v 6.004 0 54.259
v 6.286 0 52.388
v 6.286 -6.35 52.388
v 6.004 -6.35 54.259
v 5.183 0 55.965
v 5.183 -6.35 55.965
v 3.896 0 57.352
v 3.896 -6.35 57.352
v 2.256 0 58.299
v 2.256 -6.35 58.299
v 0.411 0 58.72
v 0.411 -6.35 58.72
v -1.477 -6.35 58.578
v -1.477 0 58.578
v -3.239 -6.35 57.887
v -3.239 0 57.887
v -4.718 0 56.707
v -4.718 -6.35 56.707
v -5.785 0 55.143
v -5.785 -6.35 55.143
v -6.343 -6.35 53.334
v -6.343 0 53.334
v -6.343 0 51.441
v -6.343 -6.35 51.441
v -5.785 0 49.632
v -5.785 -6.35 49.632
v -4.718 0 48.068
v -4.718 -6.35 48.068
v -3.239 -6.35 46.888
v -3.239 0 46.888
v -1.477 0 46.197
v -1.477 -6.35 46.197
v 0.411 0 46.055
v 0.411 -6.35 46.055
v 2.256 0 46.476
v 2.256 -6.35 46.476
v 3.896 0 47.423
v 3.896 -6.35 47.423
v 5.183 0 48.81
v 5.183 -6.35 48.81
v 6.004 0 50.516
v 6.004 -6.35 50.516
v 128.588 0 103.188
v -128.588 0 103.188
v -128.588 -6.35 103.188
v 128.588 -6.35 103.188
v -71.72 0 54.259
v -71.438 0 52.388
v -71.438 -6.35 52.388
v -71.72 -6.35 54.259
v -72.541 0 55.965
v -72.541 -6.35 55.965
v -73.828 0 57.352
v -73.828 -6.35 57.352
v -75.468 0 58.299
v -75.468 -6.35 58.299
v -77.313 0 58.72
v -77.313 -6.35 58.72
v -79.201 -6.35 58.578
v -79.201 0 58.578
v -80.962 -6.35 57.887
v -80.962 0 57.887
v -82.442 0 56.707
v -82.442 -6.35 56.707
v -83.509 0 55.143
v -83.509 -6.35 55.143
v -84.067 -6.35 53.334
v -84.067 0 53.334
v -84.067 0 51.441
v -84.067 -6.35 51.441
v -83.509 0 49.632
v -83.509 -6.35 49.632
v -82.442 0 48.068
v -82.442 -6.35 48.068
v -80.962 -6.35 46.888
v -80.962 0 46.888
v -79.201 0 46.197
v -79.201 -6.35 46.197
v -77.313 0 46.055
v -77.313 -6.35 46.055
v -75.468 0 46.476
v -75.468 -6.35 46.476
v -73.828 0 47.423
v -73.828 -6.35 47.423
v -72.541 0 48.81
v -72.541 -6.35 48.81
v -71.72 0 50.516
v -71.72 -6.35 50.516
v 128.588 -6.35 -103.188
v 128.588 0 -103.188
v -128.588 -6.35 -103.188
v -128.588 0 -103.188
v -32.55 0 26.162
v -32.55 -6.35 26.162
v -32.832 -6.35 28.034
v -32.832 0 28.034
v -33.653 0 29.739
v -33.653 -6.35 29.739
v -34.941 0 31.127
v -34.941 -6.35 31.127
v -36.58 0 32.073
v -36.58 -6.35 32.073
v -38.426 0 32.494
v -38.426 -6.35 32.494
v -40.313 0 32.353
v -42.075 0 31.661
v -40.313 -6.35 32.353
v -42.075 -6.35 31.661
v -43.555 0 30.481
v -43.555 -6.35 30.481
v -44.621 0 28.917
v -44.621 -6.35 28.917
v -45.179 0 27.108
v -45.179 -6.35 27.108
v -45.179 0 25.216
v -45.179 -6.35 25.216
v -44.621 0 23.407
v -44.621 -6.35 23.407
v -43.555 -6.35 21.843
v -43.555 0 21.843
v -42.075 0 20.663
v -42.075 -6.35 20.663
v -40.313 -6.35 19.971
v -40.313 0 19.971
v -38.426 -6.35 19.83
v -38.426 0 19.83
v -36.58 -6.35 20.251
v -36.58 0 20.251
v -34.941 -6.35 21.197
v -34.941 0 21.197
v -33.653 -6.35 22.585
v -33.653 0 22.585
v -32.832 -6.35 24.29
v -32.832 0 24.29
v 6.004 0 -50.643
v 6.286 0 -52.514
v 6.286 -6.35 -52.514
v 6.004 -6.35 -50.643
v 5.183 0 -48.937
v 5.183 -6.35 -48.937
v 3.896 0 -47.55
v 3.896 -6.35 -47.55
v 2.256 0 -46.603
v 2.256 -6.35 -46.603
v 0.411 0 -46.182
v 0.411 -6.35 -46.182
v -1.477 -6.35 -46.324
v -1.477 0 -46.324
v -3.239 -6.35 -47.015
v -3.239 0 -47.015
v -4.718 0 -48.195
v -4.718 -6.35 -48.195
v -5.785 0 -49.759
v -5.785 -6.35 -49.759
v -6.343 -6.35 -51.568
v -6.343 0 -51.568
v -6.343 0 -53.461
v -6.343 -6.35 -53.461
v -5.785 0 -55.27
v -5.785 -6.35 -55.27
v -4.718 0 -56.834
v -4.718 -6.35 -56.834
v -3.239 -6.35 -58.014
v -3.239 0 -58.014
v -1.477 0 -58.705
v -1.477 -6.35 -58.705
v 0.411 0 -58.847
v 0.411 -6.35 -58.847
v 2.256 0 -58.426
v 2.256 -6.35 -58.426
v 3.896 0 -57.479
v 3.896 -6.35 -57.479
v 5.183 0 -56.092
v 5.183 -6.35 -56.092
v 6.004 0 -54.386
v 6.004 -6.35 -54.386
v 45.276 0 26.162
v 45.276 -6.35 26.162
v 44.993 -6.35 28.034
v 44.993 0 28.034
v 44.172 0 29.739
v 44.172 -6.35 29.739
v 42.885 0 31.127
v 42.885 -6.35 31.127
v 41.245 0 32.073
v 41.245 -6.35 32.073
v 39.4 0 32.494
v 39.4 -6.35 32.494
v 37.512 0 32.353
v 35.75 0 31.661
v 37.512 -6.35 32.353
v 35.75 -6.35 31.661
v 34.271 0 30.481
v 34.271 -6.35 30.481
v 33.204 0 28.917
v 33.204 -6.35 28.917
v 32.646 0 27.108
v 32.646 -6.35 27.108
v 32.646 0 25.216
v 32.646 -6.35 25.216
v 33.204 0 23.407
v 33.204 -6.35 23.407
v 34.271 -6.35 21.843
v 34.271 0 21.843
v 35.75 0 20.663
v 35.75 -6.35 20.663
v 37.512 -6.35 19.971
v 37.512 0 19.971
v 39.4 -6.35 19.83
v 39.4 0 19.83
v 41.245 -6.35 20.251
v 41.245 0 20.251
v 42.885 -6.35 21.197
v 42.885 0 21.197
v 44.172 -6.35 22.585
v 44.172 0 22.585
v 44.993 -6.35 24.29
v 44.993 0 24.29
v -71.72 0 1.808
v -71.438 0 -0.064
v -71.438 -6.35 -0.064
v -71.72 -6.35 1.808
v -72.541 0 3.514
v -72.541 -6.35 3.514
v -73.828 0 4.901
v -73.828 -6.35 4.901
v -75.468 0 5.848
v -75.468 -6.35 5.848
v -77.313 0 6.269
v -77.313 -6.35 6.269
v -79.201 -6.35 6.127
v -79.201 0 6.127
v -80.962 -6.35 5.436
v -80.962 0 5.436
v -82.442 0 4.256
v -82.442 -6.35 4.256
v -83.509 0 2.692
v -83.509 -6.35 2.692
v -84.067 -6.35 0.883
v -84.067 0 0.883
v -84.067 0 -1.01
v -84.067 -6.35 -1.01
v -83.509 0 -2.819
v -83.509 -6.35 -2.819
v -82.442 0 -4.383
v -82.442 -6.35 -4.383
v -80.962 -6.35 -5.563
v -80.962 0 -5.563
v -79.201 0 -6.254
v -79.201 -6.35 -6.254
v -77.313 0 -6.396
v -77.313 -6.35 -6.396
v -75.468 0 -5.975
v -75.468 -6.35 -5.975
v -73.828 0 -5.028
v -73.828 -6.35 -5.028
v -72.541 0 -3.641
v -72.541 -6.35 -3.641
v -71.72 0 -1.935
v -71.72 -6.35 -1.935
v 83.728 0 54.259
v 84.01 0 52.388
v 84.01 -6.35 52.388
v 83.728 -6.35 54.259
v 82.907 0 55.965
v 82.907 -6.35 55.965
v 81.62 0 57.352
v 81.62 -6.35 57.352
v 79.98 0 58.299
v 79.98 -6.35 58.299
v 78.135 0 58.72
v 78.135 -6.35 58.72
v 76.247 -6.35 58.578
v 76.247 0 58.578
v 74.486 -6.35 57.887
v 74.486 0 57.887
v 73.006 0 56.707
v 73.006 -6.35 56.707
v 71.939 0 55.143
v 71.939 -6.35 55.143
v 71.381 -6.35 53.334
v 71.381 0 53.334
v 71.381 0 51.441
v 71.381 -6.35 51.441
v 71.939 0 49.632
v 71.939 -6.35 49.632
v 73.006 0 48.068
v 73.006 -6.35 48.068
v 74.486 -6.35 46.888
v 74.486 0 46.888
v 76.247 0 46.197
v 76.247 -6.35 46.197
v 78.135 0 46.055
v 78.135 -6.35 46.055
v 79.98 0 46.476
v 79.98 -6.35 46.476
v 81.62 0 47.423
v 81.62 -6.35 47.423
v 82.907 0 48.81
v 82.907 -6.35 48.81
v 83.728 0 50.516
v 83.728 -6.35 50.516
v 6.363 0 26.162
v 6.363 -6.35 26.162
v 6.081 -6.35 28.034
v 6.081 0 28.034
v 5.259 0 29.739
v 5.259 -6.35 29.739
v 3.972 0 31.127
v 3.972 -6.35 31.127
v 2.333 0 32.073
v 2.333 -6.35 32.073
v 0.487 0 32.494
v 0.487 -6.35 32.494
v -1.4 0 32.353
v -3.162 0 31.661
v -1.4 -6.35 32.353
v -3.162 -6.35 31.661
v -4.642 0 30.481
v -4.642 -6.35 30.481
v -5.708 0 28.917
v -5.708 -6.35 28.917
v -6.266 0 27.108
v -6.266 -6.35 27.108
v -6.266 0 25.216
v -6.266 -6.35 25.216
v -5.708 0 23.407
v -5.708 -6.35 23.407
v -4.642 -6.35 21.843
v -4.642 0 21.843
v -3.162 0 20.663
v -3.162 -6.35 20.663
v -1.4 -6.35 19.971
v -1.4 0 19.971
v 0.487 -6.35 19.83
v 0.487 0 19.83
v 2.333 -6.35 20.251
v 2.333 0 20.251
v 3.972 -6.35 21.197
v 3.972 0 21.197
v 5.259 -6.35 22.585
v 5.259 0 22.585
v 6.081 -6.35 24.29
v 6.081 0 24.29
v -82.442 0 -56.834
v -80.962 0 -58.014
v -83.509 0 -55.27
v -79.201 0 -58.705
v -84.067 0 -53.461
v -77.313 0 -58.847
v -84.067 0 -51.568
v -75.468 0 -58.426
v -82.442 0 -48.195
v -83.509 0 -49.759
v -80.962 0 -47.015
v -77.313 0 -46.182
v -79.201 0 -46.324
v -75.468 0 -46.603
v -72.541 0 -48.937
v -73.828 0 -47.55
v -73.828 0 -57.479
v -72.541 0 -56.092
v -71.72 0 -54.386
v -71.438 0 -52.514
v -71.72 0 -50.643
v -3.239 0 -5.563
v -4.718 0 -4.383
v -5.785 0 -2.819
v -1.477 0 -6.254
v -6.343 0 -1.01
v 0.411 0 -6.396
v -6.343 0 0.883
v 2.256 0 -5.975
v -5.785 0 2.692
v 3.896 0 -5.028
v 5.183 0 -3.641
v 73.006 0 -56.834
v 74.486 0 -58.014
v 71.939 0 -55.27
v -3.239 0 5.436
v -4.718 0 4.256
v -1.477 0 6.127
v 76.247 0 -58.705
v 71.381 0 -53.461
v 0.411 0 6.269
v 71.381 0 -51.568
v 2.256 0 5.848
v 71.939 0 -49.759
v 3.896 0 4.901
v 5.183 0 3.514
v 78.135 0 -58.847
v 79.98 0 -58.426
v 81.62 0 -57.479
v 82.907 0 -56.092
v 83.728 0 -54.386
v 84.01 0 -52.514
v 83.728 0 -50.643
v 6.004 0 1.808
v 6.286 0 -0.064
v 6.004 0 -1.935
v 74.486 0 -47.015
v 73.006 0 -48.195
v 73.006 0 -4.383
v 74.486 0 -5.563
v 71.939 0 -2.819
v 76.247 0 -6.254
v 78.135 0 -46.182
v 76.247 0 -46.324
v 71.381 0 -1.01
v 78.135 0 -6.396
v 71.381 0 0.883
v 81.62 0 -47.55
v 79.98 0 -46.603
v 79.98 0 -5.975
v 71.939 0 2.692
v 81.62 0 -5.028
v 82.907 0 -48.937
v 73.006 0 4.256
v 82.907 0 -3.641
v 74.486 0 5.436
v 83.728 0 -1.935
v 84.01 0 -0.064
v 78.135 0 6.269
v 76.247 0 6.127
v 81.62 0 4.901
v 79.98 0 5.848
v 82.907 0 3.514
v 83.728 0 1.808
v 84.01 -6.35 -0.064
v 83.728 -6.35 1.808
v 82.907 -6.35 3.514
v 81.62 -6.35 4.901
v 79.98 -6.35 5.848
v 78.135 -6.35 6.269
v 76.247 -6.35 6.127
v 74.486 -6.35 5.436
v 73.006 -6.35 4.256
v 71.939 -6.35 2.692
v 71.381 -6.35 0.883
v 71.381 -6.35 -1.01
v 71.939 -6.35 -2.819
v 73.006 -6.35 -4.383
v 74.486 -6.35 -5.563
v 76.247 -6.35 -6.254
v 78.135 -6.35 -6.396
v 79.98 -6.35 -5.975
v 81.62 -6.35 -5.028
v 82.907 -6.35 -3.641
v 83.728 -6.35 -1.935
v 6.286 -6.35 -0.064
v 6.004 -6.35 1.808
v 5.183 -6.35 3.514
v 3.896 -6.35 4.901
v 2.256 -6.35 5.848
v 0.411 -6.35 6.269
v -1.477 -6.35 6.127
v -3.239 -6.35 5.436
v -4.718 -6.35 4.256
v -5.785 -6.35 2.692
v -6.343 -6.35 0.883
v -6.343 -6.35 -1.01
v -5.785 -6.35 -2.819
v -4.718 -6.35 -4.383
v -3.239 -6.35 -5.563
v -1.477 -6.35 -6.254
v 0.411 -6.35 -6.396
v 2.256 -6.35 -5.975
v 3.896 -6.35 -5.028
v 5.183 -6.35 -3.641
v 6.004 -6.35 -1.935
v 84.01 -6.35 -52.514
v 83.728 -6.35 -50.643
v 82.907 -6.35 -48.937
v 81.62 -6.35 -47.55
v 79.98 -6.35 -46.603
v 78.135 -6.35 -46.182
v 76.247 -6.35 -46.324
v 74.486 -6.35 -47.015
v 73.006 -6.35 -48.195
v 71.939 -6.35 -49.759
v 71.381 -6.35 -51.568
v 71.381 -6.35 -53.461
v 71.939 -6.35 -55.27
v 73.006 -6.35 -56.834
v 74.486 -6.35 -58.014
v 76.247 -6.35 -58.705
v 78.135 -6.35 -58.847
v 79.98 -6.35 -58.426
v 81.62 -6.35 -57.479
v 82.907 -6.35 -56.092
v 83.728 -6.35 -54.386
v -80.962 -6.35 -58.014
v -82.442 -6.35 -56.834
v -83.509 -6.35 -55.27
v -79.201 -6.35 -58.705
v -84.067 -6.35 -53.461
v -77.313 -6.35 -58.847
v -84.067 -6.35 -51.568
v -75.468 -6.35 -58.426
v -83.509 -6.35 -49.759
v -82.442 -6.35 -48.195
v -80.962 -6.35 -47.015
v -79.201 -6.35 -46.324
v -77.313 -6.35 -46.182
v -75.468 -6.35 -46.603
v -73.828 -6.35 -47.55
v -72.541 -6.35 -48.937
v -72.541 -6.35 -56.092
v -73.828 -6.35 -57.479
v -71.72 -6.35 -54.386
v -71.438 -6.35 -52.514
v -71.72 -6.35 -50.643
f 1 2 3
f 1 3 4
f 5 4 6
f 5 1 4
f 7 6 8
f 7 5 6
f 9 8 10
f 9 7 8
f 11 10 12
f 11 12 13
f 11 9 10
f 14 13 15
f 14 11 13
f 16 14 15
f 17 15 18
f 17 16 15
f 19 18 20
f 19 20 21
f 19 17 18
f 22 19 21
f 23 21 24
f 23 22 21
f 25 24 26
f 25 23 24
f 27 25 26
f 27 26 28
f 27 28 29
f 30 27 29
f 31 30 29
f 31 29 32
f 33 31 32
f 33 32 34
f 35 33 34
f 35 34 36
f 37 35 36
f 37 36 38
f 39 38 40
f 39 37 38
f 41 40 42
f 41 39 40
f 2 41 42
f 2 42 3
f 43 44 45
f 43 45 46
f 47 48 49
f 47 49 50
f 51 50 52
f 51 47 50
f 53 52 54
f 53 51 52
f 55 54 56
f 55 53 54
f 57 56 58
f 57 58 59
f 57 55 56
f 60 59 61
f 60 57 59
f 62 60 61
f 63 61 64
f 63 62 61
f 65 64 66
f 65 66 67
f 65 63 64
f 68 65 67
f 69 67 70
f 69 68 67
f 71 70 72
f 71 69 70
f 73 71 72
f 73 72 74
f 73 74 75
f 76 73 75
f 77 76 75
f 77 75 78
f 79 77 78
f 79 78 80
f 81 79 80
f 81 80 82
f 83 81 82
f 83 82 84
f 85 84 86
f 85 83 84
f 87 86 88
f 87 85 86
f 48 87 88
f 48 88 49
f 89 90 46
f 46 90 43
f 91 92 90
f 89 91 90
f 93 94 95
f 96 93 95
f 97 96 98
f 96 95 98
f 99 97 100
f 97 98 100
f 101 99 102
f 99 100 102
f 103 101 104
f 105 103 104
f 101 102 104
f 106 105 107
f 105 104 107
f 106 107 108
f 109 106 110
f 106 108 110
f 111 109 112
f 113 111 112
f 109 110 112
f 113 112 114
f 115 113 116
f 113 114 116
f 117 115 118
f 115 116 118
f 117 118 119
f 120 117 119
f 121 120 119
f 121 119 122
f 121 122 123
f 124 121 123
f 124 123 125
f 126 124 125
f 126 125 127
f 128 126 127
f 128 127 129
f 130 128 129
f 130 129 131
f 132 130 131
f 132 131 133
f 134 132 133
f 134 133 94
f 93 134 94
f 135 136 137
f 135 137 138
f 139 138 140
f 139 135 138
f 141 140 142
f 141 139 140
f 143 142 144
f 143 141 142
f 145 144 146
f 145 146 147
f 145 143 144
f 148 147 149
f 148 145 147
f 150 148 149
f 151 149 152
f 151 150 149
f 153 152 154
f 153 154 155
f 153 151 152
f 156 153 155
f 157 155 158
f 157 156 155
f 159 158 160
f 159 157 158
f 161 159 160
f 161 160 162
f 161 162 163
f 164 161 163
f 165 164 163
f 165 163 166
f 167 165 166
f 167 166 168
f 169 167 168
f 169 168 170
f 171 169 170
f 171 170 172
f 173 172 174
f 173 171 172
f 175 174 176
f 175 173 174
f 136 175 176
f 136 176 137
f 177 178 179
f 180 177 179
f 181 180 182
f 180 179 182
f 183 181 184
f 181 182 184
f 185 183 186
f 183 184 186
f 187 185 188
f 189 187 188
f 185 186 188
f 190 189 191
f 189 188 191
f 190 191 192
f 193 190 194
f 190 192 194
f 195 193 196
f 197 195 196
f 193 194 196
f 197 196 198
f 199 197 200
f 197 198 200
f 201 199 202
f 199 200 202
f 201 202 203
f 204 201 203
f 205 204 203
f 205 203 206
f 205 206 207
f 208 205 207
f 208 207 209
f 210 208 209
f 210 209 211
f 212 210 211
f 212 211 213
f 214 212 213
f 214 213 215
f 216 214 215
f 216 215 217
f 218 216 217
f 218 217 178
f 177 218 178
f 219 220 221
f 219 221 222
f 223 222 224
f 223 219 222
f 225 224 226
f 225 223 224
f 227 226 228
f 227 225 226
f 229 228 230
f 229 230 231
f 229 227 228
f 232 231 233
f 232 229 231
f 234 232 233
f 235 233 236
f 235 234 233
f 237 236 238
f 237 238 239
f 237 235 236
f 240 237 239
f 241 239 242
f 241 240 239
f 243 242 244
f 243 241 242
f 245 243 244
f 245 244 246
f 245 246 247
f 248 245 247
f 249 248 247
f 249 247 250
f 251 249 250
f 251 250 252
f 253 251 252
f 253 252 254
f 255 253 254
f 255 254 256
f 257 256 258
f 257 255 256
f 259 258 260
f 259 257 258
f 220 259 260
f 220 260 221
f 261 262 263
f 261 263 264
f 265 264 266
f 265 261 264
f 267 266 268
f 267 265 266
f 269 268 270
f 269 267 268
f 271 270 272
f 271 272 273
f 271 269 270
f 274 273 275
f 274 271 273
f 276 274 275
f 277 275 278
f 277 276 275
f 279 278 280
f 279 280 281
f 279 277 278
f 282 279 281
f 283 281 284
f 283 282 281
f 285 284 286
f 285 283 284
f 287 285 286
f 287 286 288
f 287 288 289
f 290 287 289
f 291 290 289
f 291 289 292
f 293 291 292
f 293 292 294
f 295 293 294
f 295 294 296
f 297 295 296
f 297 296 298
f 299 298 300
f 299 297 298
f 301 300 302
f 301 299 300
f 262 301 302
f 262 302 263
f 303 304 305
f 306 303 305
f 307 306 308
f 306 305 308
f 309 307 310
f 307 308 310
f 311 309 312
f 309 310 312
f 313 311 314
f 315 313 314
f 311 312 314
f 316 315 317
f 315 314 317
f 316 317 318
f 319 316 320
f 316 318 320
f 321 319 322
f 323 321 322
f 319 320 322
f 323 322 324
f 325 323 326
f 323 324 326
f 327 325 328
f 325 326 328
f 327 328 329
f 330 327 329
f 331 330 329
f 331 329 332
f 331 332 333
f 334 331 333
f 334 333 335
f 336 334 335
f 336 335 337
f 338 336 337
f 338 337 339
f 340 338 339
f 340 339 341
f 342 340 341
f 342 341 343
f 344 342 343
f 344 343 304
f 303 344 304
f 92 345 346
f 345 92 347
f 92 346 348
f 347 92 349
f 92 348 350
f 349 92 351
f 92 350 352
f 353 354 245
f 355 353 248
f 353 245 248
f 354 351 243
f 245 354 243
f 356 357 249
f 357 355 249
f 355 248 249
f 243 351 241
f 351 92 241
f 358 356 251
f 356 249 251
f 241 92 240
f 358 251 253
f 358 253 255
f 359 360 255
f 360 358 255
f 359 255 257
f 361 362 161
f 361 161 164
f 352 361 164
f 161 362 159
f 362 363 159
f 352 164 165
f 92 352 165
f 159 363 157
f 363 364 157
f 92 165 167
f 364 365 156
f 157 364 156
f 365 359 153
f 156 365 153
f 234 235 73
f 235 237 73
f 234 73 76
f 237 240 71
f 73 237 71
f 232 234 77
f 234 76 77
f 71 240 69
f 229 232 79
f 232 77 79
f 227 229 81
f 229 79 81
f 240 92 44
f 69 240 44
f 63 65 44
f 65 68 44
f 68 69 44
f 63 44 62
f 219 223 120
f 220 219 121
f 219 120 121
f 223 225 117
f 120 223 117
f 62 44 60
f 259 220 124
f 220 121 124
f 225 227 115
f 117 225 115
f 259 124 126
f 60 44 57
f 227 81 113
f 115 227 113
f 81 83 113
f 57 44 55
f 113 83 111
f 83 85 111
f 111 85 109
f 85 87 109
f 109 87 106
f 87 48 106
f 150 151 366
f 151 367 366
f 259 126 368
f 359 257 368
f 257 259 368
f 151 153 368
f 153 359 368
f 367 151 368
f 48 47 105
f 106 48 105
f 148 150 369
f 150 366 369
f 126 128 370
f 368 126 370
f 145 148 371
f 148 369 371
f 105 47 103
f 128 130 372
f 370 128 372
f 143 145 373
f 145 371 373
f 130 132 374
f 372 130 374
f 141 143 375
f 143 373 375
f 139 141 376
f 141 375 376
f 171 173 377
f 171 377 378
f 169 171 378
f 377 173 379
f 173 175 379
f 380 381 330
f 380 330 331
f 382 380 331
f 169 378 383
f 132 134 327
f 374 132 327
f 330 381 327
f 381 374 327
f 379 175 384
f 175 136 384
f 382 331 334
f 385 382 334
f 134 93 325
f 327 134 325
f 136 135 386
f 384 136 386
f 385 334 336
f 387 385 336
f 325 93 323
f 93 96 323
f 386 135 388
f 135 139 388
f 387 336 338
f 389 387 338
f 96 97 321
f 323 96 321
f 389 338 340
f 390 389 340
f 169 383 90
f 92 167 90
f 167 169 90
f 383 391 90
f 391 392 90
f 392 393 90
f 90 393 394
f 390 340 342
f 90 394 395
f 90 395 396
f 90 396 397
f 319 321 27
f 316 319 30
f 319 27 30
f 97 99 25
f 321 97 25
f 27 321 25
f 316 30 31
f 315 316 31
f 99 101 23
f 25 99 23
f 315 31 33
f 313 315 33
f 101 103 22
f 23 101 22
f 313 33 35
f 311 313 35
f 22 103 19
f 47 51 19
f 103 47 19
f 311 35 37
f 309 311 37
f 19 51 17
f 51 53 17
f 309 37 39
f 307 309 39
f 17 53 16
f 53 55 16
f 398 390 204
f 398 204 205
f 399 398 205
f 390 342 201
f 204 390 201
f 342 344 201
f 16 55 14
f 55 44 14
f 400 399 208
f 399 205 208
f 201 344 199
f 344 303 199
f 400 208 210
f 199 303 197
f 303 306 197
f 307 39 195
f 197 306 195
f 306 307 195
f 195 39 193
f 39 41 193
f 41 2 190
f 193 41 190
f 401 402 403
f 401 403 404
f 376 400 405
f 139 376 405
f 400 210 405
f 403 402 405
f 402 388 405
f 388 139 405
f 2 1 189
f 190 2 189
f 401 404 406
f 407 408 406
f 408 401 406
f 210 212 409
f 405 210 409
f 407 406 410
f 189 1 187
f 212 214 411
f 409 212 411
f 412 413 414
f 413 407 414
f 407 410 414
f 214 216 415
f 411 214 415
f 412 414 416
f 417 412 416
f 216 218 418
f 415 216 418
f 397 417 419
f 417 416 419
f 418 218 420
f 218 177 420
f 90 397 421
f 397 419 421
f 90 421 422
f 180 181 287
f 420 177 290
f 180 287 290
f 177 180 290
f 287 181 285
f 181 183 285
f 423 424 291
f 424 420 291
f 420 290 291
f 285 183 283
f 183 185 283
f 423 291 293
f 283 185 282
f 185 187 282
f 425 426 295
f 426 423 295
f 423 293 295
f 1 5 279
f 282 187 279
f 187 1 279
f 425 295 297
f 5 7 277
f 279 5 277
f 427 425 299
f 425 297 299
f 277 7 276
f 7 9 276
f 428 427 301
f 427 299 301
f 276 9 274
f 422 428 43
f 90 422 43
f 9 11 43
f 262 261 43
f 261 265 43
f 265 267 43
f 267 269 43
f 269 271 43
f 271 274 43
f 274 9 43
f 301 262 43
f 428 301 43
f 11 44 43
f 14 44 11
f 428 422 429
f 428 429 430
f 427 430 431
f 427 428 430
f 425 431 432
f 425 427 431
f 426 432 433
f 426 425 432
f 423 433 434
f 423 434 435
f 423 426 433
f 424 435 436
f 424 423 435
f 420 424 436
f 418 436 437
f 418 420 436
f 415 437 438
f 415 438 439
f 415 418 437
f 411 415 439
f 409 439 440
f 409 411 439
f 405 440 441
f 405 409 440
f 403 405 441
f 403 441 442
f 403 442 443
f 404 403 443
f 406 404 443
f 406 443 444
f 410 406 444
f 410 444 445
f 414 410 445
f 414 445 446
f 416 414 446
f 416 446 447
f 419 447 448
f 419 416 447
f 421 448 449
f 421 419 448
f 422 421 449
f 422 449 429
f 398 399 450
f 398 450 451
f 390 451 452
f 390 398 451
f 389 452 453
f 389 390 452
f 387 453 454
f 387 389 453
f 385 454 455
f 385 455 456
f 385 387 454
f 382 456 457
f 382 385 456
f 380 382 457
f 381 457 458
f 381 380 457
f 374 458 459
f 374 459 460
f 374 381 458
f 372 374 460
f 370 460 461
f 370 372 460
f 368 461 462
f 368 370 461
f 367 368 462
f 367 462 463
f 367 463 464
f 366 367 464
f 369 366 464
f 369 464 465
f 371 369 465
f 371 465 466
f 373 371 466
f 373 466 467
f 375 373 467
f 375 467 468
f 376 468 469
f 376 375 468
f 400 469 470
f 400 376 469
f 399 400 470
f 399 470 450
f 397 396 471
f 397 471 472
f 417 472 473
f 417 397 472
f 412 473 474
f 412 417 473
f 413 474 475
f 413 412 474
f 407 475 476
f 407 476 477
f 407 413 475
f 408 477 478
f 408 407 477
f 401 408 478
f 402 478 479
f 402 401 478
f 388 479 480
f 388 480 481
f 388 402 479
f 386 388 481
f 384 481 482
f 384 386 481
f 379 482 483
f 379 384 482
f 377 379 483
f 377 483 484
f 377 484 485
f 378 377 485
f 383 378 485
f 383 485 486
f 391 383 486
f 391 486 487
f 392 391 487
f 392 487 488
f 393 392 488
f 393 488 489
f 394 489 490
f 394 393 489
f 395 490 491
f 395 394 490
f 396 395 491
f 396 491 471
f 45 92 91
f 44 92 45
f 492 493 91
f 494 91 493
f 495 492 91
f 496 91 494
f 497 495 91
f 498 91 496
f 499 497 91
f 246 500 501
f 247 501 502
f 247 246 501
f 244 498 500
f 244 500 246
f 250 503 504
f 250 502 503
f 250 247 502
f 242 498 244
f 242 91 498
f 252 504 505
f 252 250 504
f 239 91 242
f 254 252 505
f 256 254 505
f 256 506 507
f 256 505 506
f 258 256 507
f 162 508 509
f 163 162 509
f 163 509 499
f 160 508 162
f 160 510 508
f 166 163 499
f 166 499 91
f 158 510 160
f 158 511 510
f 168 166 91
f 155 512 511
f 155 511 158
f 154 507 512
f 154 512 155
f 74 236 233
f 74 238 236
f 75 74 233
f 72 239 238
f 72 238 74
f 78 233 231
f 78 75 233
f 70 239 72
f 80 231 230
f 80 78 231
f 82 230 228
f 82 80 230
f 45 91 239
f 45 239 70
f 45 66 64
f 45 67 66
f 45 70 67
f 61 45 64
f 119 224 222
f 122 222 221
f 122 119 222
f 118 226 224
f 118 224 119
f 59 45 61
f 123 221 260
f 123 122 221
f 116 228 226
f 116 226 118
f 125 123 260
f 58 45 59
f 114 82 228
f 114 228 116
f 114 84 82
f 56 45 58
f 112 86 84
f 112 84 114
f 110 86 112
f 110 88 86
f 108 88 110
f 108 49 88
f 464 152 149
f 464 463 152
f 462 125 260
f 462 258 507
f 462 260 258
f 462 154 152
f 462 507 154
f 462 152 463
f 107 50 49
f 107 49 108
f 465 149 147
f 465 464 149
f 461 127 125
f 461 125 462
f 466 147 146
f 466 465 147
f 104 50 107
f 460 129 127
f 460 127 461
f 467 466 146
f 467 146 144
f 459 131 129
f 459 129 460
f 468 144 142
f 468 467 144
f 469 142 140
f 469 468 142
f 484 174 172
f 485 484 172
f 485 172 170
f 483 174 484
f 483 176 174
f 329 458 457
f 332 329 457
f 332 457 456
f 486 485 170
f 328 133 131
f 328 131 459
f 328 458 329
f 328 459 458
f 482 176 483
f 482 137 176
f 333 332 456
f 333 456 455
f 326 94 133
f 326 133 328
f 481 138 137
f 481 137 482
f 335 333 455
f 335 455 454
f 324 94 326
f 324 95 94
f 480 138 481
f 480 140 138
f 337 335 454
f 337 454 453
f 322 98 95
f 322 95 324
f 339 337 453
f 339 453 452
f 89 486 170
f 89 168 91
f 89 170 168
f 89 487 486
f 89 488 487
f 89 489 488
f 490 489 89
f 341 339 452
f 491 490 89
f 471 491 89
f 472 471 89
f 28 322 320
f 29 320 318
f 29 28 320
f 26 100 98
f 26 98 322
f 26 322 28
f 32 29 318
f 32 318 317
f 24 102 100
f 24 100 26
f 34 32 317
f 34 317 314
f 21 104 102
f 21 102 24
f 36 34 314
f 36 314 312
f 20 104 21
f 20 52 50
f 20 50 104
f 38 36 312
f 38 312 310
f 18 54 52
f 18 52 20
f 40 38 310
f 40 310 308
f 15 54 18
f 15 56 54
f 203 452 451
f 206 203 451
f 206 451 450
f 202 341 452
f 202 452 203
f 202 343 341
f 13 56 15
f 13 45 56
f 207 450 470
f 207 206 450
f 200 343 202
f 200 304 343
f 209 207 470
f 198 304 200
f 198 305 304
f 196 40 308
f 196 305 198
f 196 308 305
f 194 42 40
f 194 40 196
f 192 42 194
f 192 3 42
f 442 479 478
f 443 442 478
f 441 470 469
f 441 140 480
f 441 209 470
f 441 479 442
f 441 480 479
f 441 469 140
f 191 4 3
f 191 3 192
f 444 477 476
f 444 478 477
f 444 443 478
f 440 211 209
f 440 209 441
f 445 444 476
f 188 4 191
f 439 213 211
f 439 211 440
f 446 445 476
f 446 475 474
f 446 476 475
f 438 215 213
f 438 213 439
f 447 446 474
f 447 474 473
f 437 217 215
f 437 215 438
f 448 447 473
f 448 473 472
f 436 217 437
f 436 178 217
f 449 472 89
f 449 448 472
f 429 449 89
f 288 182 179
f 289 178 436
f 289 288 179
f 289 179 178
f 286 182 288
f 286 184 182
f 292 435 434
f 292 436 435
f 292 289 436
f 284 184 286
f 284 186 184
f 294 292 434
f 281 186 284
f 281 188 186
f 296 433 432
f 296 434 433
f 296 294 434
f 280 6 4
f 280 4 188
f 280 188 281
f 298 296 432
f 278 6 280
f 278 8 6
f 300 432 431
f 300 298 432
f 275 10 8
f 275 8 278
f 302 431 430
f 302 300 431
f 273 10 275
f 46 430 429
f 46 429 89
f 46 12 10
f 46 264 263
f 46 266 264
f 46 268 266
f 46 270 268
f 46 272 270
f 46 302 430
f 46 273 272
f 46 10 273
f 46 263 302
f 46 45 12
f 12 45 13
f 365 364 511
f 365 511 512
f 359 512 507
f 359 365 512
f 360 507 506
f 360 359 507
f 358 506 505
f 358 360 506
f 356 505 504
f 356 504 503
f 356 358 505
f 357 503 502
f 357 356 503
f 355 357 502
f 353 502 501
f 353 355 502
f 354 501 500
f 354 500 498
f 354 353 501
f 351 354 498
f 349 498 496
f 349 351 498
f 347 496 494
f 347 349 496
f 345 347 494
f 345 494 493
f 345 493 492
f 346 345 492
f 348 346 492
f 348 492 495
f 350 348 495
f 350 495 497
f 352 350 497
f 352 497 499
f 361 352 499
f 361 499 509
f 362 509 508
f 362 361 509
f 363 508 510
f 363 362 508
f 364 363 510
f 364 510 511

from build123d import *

# Parameters (mm, degrees)
F0_W     = 257.175
F0_H     = 206.375
F0_W_2   = 206.375
F0_H_2   = 155.575
F0_R     = 6.35
F1_DEPTH = 6.35
F2_R     = 6.35
F3_DEPTH = 25.4


with BuildPart() as f1:
    # F0 (on Front) → F1 (new body)
    with BuildSketch(Plane.XZ):
        Rectangle(F0_W, F0_H)
        Rectangle(F0_W_2, F0_H_2, mode=Mode.SUBTRACT)
        Rectangle(F0_W_2, F0_H_2)
        with Locations((-77.7875, -52.5145)):
            Circle(F0_R, mode=Mode.SUBTRACT)
        with Locations((-0.0635, -52.5145)):
            Circle(F0_R, mode=Mode.SUBTRACT)
        with Locations((-77.7875, -0.0635)):
            Circle(F0_R, mode=Mode.SUBTRACT)
        with Locations((-0.0635, -0.0635)):
            Circle(F0_R, mode=Mode.SUBTRACT)
        with Locations((77.6605, -52.5145)):
            Circle(F0_R, mode=Mode.SUBTRACT)
        with Locations((77.6605, -0.0635)):
            Circle(F0_R, mode=Mode.SUBTRACT)
        with Locations((-77.7875, 52.3875)):
            Circle(F0_R, mode=Mode.SUBTRACT)
        with Locations((-0.0635, 52.3875)):
            Circle(F0_R, mode=Mode.SUBTRACT)
        with Locations((77.6605, 52.3875)):
            Circle(F0_R, mode=Mode.SUBTRACT)
    extrude(amount=F1_DEPTH)

    # F2 (on face) → F3 (cut)
    with BuildSketch(Plane.XZ.offset(6.35)):
        with Locations((-38.9001, 26.161997)):
            Circle(F2_R)
        with Locations((0.0127, 26.161997)):
            Circle(F2_R)
        with Locations((38.9255, 26.161997)):
            Circle(F2_R)
    extrude(amount=-F3_DEPTH, mode=Mode.SUBTRACT)


solid = f1.part
